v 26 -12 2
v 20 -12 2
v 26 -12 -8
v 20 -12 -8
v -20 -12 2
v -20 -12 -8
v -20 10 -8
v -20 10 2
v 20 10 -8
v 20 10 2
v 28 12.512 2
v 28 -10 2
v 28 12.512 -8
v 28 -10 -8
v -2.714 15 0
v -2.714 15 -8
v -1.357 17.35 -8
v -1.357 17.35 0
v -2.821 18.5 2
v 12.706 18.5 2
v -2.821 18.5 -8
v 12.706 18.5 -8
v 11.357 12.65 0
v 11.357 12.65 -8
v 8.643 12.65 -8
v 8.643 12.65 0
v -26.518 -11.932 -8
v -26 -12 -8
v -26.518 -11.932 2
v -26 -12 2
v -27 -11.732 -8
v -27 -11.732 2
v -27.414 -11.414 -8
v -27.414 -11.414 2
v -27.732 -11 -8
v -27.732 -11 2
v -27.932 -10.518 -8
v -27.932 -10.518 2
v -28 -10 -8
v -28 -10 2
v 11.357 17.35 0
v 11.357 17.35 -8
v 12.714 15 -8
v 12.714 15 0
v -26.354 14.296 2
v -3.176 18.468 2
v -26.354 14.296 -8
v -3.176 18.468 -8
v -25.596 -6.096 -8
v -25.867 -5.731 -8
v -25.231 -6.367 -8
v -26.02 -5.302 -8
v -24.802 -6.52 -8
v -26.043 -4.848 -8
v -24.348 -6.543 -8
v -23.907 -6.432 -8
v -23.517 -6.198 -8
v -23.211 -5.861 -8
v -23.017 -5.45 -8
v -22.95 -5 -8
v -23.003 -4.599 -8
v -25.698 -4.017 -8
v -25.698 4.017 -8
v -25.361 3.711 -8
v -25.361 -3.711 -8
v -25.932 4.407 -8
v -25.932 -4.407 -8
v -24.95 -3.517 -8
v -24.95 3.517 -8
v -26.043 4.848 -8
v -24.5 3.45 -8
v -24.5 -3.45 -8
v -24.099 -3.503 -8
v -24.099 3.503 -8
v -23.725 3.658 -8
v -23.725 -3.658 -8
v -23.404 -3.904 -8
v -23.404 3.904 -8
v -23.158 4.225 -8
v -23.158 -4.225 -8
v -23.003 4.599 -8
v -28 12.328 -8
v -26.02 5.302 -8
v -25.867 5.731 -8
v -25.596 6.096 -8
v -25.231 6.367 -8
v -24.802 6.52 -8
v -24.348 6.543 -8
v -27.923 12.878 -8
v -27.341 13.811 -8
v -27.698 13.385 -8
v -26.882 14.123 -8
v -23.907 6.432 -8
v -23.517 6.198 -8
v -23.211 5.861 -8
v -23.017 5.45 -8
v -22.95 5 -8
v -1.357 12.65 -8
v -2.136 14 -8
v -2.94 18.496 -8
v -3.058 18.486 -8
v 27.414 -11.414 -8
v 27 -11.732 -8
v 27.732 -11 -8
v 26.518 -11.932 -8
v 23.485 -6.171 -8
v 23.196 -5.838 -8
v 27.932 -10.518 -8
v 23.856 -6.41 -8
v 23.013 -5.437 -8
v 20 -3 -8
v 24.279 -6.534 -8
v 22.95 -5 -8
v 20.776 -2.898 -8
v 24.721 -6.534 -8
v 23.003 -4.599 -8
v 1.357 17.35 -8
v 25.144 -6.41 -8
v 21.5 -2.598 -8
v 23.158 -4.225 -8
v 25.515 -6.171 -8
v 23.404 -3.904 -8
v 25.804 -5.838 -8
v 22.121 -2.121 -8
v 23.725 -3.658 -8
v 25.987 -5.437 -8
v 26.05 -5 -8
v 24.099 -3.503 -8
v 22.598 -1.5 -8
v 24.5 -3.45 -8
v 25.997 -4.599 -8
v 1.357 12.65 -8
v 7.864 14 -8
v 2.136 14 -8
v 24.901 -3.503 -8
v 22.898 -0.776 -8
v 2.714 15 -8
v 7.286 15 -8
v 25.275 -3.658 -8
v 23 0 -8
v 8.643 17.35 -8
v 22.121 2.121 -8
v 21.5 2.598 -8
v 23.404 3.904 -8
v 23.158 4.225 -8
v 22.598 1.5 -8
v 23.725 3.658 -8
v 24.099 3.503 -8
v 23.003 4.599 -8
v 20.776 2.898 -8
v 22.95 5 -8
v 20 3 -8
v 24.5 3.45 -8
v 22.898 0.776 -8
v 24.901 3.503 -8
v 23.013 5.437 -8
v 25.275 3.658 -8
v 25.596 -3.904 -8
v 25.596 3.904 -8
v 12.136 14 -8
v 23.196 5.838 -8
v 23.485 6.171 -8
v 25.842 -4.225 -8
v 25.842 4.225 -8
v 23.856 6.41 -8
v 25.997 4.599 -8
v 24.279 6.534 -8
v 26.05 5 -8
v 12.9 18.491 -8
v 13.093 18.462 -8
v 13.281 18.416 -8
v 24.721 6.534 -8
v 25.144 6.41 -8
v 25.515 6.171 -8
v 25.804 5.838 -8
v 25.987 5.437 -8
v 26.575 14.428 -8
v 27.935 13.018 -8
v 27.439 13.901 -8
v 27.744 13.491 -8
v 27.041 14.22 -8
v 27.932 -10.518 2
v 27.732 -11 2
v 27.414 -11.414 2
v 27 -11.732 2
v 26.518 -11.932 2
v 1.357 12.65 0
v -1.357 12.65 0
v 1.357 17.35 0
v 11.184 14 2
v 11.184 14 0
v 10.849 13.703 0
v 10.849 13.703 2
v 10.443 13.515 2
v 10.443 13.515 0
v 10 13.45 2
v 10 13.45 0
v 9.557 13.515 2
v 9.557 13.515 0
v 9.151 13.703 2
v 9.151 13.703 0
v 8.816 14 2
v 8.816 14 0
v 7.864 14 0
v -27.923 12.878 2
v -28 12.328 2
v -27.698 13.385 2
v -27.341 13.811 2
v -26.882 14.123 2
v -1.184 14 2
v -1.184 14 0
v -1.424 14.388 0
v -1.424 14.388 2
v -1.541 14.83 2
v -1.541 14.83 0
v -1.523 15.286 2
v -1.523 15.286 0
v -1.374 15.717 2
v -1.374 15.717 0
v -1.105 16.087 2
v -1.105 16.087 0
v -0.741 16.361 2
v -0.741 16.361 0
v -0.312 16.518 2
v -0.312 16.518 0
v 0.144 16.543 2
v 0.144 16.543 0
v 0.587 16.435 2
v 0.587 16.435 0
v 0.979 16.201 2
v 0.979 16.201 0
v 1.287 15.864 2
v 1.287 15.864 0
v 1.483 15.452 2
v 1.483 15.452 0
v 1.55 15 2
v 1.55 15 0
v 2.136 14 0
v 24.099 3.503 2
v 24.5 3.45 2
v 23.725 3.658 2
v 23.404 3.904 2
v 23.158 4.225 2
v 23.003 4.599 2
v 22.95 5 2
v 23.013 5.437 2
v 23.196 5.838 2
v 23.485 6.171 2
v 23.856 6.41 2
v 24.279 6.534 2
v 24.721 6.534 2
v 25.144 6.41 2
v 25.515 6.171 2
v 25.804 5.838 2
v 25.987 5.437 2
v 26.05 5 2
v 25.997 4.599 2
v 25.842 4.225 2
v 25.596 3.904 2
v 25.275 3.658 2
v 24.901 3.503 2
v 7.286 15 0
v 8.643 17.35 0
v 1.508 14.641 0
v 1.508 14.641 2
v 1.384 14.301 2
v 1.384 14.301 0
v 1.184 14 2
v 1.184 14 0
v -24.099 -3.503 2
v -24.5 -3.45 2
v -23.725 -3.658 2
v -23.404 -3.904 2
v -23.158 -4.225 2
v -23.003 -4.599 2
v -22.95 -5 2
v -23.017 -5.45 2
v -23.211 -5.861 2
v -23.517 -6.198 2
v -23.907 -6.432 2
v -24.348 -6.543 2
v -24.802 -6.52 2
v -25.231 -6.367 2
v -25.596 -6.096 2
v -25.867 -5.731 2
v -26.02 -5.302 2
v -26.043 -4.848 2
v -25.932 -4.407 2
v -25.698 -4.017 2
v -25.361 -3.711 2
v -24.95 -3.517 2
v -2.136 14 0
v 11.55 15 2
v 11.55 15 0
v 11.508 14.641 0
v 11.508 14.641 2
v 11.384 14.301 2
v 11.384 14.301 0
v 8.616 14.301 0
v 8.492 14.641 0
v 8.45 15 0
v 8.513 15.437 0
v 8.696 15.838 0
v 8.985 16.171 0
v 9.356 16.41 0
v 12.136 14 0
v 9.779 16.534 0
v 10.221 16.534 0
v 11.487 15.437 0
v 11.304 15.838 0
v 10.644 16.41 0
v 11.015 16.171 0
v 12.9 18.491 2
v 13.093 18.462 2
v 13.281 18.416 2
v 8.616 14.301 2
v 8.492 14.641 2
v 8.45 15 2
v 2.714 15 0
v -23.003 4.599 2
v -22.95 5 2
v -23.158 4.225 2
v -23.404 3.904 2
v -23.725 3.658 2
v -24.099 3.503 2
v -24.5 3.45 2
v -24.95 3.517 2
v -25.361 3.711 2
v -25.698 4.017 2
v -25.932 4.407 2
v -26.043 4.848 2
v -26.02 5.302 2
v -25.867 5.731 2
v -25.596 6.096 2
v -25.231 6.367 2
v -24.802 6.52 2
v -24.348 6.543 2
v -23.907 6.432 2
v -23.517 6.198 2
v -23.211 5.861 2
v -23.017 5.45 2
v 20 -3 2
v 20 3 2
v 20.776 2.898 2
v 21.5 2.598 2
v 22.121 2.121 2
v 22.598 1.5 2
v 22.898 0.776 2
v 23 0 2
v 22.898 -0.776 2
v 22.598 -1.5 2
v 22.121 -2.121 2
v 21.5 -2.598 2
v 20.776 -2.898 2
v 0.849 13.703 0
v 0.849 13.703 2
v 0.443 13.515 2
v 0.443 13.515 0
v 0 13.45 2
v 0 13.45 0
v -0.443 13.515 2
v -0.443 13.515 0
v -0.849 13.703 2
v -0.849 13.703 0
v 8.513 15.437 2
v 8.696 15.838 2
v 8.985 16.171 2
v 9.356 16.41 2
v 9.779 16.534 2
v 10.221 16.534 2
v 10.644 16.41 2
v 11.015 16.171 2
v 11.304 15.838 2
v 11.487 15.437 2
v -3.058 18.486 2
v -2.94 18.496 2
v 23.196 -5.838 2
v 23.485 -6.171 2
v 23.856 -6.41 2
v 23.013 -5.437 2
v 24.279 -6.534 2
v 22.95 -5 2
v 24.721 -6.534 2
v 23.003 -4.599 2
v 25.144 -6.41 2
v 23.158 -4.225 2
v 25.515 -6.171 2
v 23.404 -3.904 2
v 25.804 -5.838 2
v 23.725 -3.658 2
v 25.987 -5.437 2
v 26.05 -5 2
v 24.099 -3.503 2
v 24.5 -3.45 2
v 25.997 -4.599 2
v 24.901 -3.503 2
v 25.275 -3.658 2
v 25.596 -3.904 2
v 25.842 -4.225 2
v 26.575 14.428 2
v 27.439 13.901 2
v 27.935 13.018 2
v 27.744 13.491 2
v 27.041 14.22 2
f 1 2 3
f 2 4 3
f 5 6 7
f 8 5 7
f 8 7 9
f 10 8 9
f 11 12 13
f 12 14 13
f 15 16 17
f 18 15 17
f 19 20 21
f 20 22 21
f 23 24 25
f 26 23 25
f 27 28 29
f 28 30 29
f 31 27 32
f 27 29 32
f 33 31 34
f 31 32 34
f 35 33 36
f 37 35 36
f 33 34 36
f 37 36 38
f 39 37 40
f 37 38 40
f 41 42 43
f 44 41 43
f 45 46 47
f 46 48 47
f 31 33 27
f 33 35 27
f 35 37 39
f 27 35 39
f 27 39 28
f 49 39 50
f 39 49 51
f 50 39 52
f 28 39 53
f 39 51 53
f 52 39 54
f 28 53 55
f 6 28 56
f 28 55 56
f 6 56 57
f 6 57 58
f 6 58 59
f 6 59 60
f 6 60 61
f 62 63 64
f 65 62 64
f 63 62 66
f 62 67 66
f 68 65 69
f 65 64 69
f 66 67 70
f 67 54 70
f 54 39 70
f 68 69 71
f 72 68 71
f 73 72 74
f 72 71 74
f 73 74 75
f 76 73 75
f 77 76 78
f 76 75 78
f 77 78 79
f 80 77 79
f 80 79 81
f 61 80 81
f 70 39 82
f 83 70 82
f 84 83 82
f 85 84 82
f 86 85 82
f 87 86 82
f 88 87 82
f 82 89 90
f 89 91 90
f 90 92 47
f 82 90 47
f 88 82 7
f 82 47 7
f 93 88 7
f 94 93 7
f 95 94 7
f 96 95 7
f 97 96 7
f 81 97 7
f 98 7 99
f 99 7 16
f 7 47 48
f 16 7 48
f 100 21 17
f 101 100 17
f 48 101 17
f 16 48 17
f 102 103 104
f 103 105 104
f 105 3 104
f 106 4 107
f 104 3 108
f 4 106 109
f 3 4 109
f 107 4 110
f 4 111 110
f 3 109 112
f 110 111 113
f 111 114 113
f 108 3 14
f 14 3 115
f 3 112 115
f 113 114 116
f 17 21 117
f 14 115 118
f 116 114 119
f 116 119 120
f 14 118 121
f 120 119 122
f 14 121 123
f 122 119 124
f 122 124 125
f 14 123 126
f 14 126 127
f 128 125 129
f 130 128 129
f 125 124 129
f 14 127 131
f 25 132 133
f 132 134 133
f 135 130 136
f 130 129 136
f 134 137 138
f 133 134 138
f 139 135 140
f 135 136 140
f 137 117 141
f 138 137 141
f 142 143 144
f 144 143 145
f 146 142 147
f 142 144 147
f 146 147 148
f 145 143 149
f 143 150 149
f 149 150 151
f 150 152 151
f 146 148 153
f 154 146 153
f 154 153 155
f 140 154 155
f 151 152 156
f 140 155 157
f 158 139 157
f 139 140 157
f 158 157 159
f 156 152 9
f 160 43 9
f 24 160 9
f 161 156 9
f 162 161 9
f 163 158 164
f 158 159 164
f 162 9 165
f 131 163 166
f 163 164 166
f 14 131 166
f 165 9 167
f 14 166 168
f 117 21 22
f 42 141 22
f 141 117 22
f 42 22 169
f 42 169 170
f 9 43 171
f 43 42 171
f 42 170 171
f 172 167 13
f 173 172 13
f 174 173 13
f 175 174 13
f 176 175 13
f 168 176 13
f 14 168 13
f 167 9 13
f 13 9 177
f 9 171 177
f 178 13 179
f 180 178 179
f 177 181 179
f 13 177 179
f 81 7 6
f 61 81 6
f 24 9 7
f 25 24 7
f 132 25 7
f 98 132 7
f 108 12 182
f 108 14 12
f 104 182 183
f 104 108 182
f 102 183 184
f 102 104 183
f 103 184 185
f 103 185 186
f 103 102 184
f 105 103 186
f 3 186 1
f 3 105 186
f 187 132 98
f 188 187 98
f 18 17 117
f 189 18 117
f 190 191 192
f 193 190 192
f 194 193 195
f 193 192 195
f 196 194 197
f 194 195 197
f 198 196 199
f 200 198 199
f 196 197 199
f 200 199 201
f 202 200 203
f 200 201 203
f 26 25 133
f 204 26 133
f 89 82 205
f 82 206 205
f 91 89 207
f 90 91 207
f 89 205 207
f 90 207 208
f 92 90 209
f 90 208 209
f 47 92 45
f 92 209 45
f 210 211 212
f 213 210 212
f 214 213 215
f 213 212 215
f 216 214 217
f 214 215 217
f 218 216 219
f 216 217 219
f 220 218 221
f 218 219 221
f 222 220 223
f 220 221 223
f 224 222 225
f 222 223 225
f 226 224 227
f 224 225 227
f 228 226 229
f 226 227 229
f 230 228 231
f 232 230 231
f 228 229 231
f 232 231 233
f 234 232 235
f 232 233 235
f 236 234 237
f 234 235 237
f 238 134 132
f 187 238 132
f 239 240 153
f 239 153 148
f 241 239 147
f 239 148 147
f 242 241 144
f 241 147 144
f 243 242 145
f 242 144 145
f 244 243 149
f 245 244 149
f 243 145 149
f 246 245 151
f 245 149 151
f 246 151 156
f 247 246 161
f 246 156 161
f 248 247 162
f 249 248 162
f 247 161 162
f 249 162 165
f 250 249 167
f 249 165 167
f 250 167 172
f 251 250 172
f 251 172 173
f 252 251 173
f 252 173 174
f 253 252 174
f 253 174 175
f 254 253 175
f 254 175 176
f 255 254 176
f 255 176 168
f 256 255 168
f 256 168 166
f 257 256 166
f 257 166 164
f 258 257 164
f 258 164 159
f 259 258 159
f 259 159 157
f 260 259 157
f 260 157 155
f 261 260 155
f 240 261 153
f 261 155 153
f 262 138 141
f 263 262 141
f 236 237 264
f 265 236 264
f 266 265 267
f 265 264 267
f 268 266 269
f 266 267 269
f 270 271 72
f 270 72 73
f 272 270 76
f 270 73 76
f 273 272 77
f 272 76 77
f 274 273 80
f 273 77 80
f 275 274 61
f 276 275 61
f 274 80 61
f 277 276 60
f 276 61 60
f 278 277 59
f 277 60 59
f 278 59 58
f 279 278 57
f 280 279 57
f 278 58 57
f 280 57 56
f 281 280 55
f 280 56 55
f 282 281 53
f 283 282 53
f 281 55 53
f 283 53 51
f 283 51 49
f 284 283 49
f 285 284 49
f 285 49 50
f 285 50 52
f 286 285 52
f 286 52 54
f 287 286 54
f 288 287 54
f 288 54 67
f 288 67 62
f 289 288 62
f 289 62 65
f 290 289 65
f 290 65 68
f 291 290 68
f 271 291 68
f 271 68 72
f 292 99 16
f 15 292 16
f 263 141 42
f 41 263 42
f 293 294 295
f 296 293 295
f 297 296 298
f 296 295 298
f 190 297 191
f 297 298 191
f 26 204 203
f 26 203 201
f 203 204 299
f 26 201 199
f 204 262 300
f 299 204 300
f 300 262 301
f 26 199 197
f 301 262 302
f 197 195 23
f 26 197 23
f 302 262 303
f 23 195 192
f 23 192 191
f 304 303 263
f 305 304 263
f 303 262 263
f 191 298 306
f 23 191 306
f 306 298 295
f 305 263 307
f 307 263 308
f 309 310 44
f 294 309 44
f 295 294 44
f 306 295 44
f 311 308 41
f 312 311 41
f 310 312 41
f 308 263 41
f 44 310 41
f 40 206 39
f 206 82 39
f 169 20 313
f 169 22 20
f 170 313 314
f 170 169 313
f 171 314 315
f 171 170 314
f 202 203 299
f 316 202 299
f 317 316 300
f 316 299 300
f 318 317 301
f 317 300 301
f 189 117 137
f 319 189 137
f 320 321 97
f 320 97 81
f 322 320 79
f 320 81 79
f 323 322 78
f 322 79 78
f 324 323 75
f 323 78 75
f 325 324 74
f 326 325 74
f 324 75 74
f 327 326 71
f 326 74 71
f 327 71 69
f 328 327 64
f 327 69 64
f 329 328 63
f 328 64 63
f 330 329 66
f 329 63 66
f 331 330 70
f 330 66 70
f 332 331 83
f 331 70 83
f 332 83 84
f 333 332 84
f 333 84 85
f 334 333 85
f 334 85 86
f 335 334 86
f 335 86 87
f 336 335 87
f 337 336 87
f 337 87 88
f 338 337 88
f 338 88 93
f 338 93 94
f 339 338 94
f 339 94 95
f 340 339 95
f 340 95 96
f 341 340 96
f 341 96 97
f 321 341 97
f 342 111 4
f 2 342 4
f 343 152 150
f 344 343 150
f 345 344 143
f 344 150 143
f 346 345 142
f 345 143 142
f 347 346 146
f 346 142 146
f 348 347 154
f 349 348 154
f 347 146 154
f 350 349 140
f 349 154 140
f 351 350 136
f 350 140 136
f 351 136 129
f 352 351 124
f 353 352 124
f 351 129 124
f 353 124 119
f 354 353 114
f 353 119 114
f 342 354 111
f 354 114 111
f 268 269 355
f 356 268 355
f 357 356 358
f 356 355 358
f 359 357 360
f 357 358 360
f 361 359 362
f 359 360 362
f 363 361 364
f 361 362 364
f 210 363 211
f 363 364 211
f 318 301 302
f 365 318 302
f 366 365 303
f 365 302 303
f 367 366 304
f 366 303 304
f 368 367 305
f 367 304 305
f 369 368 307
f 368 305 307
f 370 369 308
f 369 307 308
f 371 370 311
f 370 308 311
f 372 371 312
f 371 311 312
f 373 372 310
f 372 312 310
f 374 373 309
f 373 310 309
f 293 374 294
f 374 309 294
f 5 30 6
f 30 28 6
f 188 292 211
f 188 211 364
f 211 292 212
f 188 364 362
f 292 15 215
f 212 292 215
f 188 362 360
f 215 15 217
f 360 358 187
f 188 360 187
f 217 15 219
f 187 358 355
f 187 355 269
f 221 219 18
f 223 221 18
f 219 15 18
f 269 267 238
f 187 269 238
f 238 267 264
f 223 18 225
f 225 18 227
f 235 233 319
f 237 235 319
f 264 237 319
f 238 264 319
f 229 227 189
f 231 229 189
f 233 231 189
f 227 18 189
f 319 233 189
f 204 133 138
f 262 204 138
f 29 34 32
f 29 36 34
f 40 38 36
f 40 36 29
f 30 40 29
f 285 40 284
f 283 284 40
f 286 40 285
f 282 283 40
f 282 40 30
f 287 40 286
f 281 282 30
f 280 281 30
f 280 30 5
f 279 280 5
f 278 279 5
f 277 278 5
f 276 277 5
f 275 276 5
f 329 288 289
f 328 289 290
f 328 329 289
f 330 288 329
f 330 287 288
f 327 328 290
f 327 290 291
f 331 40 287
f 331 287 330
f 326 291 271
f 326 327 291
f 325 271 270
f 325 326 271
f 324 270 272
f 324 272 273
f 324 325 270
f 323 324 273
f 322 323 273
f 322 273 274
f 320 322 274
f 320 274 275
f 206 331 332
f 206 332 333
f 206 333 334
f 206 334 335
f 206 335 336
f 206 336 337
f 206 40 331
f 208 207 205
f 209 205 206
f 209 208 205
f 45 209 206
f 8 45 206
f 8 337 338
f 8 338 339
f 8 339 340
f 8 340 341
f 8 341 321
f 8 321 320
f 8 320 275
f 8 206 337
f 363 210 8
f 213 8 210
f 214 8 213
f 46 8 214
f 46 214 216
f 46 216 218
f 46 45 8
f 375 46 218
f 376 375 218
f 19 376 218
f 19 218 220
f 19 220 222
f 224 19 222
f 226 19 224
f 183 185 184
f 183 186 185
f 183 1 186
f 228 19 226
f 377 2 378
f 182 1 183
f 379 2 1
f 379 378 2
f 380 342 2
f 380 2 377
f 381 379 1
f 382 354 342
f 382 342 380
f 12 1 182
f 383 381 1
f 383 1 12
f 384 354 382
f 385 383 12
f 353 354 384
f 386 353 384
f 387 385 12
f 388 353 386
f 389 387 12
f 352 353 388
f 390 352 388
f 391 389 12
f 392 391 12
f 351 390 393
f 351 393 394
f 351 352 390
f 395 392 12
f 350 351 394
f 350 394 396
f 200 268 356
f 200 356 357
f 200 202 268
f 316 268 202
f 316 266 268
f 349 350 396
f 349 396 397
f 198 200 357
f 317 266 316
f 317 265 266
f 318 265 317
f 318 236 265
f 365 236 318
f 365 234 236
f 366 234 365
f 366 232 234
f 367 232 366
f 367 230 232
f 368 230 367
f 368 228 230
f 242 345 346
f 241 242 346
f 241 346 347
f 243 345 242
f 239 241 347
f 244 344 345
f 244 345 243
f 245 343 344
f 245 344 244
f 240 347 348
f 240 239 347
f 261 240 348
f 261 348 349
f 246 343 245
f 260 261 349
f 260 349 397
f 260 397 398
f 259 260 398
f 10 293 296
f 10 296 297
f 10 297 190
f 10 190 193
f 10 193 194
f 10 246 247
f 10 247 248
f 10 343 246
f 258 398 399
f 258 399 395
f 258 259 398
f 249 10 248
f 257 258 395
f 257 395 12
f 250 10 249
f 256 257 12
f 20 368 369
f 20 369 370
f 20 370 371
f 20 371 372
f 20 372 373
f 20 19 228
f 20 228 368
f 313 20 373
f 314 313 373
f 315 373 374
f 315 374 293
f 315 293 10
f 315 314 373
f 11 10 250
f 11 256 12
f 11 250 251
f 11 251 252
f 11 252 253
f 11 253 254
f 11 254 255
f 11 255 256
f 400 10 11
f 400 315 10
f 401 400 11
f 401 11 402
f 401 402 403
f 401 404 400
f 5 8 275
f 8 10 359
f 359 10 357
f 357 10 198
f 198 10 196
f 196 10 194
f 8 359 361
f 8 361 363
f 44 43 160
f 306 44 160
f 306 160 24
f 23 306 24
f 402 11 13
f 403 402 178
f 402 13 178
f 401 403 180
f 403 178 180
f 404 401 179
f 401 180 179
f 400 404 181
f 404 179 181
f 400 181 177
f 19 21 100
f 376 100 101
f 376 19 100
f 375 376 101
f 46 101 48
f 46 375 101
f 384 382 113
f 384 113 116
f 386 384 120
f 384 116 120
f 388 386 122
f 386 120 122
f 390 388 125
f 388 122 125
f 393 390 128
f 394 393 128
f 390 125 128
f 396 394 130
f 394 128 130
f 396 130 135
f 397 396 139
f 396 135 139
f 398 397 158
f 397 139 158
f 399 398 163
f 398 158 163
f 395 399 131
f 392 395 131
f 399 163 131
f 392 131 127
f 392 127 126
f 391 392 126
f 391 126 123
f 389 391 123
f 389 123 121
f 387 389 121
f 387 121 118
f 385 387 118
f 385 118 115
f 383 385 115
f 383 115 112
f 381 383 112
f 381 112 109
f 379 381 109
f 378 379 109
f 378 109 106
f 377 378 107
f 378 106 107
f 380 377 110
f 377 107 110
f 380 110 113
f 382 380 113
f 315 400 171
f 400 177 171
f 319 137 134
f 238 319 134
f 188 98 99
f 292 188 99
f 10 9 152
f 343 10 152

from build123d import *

# Parameters (mm, degrees)
SKETCH_1_R      = 1.55
EXTRUDE_3_DEPTH = 2
EXTRUDE_START   = -8
SKETCH_1_7_R    = 1.55
EXTRUDE_5_DEPTH = 8
FILLET_4_R      = 2


with BuildPart() as part:
    # 草图1 → 凸台-拉伸3 (new body)
    with BuildSketch(Plane.XY):
        with BuildLine():
            ThreePointArc((20, 3), (23, 0), (20, -3))
            Line((20, -3), (20, -12))
            Line((20, -12), (28, -12))
            Line((28, -12), (28, 14))
            Line((28, 14), (13, 18.5))
            Line((13, 18.5), (-3, 18.5))
            Line((-3, 18.5), (-28, 14))
            Line((-28, 14), (-28, -12))
            Line((-28, -12), (-20, -12))
            Line((-20, -12), (-20, 10))
            Line((-20, 10), (20, 10))
            Line((20, 10), (20, 3))
        make_face()
        with Locations((24.5, 5)):
            Circle(SKETCH_1_R, mode=Mode.SUBTRACT)
        with Locations((24.5, -5)):
            Circle(SKETCH_1_R, mode=Mode.SUBTRACT)
        with Locations((-24.5, 5)):
            Circle(SKETCH_1_R, mode=Mode.SUBTRACT)
        with Locations((-24.5, -5)):
            Circle(SKETCH_1_R, mode=Mode.SUBTRACT)
        with Locations((0, 15)):
            Circle(SKETCH_1_R, mode=Mode.SUBTRACT)
        with Locations((10, 15)):
            Circle(SKETCH_1_R, mode=Mode.SUBTRACT)
    extrude(amount=EXTRUDE_3_DEPTH)

    # 草图1<7> → 凸台-拉伸5 (add)
    with BuildSketch(Plane.XY.offset(EXTRUDE_START)):
        with BuildLine():
            ThreePointArc((20, 3), (23, 0), (20, -3))
            Line((20, -3), (20, -12))
            Line((20, -12), (28, -12))
            Line((28, -12), (28, 14))
            Line((28, 14), (13, 18.5))
            Line((13, 18.5), (-3, 18.5))
            Line((-3, 18.5), (-28, 14))
            Line((-28, 14), (-28, -12))
            Line((-28, -12), (-20, -12))
            Line((-20, -12), (-20, 10))
            Line((-20, 10), (20, 10))
            Line((20, 10), (20, 3))
        make_face()
        with Locations((24.5, 5)):
            Circle(SKETCH_1_7_R, mode=Mode.SUBTRACT)
        with Locations((24.5, -5)):
            Circle(SKETCH_1_7_R, mode=Mode.SUBTRACT)
        with Locations((-24.5, 5)):
            Circle(SKETCH_1_7_R, mode=Mode.SUBTRACT)
        with Locations((-24.5, -5)):
            Circle(SKETCH_1_7_R, mode=Mode.SUBTRACT)
        Polygon((-1.356773133, 12.65), (-2.713546265, 15), (-1.356773133, 17.35), (1.356773133, 17.35), (2.713546265, 15), (1.356773133, 12.65), align=None, mode=Mode.SUBTRACT)
        Polygon((8.643226867, 12.65), (7.286453735, 15), (8.643226867, 17.35), (11.356773133, 17.35), (12.713546265, 15), (11.356773133, 12.65), align=None, mode=Mode.SUBTRACT)
    extrude(amount=EXTRUDE_5_DEPTH)

    # 圆角4
    fillet_4_edges = [part.edges().sort_by_distance(p)[0] for p in [
        (28, -12, -3),
        (-28, -12, -3),
        (-28, 14, -3),
        (-3, 18.5, -3),
        (13, 18.5, -3),
        (28, 14, -3),
    ]]
    fillet(fillet_4_edges, radius=FILLET_4_R)


solid = part.part
